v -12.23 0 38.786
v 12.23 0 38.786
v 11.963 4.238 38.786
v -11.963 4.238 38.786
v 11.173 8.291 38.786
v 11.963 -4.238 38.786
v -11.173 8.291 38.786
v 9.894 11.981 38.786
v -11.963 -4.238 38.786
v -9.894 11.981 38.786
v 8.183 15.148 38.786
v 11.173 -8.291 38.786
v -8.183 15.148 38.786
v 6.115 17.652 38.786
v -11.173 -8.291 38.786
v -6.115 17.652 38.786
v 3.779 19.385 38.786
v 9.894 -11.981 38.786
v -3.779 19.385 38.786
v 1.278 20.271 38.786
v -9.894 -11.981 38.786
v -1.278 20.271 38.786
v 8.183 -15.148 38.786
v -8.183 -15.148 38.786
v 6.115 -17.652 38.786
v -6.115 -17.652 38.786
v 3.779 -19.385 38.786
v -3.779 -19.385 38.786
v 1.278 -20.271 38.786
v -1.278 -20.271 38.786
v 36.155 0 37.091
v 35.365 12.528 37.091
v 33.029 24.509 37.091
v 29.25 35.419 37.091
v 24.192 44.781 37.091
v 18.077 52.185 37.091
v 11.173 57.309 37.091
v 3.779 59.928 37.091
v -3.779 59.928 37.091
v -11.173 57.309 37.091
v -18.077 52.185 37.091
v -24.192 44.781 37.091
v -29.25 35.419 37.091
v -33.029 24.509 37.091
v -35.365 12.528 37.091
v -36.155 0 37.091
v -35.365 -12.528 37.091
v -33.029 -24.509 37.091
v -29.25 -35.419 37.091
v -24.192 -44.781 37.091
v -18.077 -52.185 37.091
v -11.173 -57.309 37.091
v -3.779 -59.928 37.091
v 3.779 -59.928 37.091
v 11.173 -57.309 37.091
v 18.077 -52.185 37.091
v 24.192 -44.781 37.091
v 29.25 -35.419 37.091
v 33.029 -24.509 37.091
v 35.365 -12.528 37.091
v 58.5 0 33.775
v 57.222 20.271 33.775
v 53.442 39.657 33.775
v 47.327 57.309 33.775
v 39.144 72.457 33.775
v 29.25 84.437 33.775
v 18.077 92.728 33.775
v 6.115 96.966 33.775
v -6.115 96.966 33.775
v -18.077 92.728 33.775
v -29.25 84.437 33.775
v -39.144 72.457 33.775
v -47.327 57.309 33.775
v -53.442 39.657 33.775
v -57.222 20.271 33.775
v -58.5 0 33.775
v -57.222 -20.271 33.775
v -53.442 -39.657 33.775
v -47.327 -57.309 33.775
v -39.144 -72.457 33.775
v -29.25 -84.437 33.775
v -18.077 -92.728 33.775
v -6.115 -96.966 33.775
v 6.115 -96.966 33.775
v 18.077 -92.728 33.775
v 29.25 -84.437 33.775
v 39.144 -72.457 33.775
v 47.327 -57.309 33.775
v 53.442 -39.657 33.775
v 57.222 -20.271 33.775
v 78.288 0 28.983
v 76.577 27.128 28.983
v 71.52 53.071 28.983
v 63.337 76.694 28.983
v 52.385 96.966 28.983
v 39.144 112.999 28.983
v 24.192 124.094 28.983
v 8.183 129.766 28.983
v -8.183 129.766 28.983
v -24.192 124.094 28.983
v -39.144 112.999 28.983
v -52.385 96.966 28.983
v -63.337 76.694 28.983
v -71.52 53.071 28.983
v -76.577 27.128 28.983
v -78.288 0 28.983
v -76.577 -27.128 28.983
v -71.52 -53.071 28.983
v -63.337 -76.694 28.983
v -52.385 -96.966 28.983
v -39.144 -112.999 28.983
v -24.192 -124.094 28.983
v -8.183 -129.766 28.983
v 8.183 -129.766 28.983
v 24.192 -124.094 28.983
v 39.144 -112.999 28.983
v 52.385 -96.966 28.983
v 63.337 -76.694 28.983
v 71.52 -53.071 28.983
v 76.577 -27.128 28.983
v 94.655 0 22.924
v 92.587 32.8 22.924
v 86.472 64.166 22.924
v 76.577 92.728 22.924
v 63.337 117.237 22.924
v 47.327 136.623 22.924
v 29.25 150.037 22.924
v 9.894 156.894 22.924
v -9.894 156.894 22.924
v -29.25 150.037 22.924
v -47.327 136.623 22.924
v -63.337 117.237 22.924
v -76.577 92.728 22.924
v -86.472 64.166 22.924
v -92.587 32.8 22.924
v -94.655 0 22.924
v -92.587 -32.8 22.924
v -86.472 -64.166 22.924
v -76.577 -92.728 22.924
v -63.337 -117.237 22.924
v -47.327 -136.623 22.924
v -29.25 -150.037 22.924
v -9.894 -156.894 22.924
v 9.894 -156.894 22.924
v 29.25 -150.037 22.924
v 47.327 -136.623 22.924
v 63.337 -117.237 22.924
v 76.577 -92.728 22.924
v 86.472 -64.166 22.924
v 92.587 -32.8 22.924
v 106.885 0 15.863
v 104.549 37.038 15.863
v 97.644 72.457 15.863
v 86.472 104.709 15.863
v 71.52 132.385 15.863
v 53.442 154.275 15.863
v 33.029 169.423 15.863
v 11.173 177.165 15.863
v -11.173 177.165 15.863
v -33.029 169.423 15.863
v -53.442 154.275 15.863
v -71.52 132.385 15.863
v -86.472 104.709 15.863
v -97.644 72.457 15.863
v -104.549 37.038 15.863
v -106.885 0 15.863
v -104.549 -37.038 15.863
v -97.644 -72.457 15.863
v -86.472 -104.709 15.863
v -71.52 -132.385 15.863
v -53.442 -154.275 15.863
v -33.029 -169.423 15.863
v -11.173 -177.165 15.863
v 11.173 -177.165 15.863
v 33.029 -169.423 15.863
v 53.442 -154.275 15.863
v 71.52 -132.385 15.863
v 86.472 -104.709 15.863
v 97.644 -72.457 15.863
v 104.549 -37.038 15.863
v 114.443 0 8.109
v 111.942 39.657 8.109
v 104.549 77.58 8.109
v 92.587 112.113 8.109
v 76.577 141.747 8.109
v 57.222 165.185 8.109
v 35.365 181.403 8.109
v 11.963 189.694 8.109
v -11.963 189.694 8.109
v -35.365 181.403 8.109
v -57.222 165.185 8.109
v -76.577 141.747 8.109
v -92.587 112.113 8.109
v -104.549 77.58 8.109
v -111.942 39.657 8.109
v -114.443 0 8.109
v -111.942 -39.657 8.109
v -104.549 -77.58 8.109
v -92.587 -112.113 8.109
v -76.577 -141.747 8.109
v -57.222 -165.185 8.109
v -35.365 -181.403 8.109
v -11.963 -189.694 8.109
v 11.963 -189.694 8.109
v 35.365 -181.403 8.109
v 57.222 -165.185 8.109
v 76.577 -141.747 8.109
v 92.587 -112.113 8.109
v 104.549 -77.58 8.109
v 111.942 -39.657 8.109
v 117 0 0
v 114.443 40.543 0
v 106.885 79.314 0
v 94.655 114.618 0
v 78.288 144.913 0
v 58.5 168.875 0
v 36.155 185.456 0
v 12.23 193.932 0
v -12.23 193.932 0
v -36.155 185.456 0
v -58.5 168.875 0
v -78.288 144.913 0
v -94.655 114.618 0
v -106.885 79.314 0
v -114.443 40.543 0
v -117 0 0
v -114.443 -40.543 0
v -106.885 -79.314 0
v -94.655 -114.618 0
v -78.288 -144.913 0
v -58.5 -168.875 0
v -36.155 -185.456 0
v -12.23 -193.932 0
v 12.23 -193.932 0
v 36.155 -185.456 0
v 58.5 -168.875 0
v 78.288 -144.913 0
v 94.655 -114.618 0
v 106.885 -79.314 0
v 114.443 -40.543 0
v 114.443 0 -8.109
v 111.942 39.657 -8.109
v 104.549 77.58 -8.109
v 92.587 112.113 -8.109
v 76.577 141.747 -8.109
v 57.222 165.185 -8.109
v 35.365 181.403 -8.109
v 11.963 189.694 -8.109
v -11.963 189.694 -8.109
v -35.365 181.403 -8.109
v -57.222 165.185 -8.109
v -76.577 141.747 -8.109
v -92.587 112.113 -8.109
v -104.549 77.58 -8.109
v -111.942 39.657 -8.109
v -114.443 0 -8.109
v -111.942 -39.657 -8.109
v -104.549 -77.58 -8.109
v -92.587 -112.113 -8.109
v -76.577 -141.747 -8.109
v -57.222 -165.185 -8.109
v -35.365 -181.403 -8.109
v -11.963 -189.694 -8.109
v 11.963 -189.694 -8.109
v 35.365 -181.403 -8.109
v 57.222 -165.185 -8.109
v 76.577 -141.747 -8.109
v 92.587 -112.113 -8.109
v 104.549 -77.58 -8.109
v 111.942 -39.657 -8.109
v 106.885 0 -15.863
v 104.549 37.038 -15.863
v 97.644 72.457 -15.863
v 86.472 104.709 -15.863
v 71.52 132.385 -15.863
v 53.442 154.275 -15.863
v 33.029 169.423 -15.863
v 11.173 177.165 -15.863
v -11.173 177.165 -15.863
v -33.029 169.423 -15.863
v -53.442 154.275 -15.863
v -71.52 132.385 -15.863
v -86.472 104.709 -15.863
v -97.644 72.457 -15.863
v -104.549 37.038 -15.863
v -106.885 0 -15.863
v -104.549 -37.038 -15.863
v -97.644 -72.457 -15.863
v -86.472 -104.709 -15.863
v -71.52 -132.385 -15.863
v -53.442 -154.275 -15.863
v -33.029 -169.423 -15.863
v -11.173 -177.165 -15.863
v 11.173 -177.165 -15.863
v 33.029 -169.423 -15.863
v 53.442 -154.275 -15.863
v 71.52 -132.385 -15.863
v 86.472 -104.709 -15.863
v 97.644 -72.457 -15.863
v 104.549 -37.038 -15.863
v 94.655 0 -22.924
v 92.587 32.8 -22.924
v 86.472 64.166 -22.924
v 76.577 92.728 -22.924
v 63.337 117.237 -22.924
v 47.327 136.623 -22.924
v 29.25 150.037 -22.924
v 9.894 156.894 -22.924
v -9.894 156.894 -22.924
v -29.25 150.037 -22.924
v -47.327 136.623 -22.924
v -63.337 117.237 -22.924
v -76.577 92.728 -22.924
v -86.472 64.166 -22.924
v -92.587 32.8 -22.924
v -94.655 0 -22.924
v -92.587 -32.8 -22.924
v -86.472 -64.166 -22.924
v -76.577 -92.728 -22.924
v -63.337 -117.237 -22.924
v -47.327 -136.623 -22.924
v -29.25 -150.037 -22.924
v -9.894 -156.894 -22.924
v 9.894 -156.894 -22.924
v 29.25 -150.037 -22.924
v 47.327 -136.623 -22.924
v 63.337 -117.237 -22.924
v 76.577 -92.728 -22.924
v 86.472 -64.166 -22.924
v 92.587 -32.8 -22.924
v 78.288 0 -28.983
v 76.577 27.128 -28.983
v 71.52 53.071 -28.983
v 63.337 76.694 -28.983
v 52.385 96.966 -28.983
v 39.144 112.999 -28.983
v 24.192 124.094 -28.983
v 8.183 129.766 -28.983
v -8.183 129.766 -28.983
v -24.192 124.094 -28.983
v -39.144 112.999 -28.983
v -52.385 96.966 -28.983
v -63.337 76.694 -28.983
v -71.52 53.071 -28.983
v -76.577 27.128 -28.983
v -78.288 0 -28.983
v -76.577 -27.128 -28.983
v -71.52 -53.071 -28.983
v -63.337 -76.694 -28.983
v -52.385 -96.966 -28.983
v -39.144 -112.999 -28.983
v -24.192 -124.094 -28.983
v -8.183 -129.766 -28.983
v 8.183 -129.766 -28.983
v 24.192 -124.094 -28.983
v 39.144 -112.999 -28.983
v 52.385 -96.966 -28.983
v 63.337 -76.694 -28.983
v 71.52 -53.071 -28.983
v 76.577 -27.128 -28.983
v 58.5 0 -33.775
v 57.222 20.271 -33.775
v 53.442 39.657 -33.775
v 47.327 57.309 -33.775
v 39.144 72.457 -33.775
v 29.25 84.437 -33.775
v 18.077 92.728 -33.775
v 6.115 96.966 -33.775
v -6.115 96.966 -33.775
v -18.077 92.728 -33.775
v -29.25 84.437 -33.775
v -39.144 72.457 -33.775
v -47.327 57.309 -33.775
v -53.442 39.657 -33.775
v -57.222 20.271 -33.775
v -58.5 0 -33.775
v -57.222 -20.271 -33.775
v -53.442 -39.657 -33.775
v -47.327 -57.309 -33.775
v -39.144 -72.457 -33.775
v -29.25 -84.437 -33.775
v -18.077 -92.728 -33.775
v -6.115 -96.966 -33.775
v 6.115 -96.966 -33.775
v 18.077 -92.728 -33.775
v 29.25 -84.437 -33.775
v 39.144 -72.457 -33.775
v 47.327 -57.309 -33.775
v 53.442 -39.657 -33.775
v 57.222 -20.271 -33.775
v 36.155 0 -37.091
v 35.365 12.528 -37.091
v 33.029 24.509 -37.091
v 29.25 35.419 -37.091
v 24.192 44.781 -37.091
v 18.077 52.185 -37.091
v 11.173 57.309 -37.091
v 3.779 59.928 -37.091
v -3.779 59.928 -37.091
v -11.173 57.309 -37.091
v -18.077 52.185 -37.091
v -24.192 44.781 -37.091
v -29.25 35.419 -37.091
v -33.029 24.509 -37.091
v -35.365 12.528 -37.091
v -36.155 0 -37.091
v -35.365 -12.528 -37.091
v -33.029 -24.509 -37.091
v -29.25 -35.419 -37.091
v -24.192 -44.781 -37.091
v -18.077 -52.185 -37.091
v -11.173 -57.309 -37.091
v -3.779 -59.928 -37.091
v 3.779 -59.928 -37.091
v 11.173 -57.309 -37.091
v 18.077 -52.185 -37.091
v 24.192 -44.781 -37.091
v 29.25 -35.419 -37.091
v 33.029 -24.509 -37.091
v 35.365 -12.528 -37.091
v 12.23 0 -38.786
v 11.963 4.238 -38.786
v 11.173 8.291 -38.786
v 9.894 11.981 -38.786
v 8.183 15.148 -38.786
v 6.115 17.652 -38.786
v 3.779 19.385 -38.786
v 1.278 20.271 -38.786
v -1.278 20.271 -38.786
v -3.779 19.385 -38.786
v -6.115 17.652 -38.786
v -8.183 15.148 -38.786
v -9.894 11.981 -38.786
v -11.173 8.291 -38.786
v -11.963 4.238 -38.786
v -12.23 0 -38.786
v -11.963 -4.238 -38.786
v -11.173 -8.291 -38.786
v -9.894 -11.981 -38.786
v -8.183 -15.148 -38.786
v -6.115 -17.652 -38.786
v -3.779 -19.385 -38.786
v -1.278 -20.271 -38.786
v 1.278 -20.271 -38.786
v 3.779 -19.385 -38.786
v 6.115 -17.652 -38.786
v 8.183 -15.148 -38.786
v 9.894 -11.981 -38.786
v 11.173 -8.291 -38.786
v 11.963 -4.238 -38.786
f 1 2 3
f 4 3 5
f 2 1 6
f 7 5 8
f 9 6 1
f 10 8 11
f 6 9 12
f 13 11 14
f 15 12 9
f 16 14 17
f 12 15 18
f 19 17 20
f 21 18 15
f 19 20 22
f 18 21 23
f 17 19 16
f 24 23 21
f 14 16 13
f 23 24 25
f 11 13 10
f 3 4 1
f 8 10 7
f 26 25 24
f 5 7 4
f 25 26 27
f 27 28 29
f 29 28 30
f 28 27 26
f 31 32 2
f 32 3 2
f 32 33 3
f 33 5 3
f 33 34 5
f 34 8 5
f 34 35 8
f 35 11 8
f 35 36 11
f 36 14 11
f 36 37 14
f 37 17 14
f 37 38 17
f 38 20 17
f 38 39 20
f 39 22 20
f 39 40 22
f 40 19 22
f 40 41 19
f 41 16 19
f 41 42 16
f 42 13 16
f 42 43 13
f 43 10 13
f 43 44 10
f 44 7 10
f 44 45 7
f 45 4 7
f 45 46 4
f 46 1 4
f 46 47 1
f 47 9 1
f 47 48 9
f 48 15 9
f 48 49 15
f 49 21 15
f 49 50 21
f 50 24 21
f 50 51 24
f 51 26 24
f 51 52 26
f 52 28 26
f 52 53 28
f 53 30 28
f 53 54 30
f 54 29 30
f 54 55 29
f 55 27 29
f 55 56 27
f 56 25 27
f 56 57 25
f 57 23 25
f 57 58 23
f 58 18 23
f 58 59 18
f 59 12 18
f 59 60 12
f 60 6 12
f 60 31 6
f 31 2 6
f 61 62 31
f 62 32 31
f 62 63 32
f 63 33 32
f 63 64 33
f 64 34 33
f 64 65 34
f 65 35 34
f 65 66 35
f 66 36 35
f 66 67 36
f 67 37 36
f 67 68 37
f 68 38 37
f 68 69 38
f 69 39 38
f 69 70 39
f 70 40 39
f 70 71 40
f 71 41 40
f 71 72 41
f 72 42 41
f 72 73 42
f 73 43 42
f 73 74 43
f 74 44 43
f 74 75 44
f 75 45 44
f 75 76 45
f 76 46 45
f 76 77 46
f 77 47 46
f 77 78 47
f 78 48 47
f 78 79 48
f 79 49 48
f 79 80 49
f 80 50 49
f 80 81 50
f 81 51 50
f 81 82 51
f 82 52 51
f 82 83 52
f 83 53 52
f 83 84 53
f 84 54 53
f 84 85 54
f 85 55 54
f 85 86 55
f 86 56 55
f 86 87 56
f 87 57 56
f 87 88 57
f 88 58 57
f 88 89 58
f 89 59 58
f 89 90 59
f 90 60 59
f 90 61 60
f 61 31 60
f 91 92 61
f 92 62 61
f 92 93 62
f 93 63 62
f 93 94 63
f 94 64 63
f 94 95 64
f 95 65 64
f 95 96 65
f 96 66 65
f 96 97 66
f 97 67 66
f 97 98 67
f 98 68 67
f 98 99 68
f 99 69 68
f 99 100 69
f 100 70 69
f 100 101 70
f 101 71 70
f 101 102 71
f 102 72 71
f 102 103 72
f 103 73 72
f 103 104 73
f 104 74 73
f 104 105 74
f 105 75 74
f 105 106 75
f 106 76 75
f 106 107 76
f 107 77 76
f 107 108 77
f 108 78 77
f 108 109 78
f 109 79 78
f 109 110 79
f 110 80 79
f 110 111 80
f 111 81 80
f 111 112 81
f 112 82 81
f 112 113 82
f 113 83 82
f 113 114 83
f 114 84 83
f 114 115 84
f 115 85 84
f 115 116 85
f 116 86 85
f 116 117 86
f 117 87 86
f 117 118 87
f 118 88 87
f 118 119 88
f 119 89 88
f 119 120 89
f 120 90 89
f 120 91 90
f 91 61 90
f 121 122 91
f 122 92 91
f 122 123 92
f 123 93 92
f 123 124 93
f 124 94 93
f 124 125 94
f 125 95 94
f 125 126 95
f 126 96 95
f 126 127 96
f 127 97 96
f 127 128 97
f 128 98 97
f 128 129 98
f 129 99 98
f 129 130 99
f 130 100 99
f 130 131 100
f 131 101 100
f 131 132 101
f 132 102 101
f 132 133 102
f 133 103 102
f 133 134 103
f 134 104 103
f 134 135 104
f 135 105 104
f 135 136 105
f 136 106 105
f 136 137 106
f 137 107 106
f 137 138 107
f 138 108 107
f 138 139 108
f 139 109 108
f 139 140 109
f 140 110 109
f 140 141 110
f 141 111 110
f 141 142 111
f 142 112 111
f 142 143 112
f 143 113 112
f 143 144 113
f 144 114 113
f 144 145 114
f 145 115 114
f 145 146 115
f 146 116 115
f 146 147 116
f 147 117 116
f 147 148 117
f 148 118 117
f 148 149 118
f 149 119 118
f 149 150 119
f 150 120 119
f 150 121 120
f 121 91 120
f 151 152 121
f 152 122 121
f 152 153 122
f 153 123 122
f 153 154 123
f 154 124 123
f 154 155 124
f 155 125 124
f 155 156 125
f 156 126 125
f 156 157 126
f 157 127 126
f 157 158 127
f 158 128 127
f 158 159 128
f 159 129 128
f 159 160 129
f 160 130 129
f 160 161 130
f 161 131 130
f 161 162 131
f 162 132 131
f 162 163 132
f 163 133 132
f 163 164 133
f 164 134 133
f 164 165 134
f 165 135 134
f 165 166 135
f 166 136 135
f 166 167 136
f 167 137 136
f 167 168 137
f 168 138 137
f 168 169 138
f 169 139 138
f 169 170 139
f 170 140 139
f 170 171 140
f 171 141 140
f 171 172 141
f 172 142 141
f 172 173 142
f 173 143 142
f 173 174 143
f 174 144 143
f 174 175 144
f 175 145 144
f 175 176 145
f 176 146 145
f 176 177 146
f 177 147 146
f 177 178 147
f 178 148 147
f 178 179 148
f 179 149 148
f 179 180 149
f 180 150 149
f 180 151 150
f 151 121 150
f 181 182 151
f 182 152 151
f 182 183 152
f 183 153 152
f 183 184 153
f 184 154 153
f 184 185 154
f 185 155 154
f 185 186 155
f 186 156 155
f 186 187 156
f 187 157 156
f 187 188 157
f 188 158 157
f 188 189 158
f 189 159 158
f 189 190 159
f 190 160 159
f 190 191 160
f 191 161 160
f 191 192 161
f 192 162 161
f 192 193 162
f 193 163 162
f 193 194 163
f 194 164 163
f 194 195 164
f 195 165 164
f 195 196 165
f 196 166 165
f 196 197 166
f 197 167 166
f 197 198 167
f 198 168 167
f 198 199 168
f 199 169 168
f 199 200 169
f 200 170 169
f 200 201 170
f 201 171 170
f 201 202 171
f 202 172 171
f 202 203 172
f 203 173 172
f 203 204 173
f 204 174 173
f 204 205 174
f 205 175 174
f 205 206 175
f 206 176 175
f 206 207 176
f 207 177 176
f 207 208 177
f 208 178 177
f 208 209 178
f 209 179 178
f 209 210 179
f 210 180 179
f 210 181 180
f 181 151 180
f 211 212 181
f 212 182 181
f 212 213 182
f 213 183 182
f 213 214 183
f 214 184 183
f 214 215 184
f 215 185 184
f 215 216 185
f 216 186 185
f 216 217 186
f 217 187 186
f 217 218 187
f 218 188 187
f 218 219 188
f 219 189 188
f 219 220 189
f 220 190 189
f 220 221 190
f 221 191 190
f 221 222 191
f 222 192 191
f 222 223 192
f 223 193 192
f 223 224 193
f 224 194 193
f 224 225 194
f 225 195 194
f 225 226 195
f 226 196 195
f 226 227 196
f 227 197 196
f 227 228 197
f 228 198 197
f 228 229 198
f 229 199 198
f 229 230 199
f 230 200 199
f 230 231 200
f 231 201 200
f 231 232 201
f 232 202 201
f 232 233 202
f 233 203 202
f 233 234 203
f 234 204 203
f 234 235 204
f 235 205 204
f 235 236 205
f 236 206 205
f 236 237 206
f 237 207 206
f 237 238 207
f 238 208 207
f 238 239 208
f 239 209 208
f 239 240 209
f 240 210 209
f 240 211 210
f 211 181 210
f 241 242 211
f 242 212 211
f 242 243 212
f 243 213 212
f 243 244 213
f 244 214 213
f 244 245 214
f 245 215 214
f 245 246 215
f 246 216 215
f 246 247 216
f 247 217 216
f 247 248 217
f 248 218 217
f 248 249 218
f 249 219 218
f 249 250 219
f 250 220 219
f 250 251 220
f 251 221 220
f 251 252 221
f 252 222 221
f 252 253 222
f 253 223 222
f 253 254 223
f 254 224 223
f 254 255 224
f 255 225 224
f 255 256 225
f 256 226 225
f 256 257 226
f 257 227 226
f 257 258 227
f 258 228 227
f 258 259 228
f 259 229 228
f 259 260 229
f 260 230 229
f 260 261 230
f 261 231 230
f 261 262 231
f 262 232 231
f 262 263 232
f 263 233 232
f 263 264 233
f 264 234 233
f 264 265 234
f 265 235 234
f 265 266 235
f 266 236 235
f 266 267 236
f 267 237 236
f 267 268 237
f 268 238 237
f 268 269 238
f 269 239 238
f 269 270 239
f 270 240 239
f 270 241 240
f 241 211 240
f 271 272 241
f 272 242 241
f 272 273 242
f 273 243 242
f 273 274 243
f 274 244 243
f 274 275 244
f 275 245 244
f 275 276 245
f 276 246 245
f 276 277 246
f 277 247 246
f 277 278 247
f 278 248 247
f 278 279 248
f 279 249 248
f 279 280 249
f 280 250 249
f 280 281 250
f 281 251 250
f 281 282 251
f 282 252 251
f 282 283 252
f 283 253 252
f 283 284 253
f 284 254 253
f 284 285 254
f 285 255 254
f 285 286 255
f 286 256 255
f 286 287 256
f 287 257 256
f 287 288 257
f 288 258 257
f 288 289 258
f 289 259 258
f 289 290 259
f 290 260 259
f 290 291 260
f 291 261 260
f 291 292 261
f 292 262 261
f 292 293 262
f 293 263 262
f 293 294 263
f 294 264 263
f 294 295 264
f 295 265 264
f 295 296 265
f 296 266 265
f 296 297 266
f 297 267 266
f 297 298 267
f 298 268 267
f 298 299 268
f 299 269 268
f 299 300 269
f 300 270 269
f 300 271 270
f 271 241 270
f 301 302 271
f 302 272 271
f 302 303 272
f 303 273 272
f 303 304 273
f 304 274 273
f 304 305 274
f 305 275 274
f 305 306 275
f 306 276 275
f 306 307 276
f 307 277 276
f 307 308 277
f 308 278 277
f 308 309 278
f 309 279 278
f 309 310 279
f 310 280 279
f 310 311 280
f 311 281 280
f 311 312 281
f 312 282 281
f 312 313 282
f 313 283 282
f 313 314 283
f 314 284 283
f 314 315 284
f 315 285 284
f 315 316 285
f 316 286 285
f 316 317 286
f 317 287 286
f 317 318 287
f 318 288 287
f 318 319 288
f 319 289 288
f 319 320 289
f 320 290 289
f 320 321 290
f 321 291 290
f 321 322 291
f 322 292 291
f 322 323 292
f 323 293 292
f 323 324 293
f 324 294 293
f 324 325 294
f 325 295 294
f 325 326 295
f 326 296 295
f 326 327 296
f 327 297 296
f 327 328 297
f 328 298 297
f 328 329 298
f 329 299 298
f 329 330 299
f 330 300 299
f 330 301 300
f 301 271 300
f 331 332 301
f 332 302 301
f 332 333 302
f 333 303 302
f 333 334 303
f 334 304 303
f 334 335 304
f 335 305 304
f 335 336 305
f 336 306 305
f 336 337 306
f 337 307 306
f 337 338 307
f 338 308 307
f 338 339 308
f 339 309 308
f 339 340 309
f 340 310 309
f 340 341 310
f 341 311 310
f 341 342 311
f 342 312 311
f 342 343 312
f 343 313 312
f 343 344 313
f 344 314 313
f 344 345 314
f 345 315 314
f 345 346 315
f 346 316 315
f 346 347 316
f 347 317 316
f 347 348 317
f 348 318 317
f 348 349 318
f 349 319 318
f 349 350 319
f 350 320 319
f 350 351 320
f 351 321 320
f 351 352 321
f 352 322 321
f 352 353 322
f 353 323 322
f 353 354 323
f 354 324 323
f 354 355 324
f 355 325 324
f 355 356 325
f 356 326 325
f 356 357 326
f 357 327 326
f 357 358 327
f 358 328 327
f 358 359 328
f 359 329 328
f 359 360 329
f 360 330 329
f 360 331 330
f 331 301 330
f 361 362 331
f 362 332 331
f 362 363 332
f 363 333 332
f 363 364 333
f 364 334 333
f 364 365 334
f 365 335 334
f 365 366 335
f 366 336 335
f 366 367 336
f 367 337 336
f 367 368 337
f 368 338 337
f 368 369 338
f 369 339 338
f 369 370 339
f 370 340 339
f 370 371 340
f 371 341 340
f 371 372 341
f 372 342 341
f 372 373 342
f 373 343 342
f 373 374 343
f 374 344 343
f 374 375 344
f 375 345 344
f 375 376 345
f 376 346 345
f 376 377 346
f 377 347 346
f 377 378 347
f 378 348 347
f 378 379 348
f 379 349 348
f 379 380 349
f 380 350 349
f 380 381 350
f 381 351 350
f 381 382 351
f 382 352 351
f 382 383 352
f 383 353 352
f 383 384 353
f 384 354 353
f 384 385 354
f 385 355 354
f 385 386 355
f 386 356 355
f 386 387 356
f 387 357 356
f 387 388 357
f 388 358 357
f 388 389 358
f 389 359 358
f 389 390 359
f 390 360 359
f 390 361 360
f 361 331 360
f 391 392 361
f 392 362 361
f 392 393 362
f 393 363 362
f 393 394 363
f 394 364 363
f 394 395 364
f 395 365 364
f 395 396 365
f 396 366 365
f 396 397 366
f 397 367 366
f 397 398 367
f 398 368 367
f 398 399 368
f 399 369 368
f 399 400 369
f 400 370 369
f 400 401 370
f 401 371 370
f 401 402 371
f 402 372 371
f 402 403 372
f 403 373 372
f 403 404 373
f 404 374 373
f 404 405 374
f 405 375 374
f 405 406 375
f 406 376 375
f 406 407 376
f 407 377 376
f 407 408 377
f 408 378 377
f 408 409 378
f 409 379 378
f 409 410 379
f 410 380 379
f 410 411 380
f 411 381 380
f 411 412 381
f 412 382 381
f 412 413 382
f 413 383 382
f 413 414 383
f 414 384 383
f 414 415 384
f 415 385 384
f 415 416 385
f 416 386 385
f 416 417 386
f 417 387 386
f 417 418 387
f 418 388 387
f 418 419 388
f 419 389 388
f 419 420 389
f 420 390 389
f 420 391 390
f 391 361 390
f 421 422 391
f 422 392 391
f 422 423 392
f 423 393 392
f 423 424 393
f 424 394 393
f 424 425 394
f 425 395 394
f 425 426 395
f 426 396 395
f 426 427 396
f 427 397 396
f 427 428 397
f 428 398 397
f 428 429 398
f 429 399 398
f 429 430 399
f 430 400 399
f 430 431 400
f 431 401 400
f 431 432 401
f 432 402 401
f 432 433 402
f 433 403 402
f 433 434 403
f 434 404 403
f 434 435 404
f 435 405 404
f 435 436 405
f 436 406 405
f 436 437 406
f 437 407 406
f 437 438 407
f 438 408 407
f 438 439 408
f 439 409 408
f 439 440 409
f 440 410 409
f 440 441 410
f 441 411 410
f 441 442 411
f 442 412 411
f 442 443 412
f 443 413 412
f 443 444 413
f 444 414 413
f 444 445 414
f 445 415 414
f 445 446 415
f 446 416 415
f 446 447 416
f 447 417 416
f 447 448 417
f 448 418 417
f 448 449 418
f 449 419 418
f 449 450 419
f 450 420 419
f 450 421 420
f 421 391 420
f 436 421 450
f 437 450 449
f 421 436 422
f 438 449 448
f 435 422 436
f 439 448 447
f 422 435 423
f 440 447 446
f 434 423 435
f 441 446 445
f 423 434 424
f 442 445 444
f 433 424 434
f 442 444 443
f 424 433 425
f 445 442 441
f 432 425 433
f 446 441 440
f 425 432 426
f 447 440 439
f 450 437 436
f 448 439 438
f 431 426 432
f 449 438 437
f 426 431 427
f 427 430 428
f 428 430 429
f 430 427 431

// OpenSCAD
// Generated by SolidPython 1.0.1 on 2020-07-29 00:46:49


scale(v = [9, 15, 3]) {
	sphere(r = 13);
}
/***********************************************
*********      SolidPython code:      **********
************************************************
 
# import packages: SolidPython
from solid import *
from solid.utils import *
from itertools import chain, combinations, permutations


class Resize:

    def __init__(self, scad_file):
        self.scad_file = scad_file
        #self.scad_file = import_scad(scad_file)
        # cone/cylinder param:
        self.r1 = 0
        self.r2 = 0
        self.h = 0
        # rectangular prism param:
        self.w = 0
        self.l = 0
        # ellipse param:
        self.r = 0

    # import OpenScad code (file name corresponds to shape)


    # classify shape + parameters
    def assign(self, param1, param2, param3):
        if self.scad_file == 'cone.scad':
            self.r1 = param1
            self.r2 = param2
            self.h = param3
        elif self.scad_file == 'cylinder.scad':
            self.r1 = param1
            self.r2 = param2
            self.h = param3
        elif self.scad_file == 'rectangularPrism.scad':
            self.h = param1
            self.l = param2
            self.w = param3
        else:
            self.r = param1
            self.h = param2

    # resize parameters
    def iterate(self):
        x = range(3, 20, 2)
        i = 1
        if self.scad_file == 'cone.scad':
            tempList = list(permutations(x, 2))
            for temp in tempList:
                param1 = temp[0]
                param2 = temp[1]
                filepath = 'produced_scad_files/' + 'cone' + str(param1) + '_' + str(param2) + '_' + '.scad'
                scad_render_to_file(cylinder(h=param1, r1=param2, r2=0), filepath)

        elif self.scad_file == 'cylinder.scad':
            tempList = list(permutations(x, 3))
            for temp in tempList:
                param1 = temp[0]
                param2 = temp[1]
                filepath = 'produced_scad_files/' + 'cylinder' + str(param1) + '_' + str(param2) + '_' + '.scad'
                scad_render_to_file(cylinder(h=param1, r1=param2, r2=param2), filepath)

        elif self.scad_file == 'rectangularPrism.scad':
            tempList = list(permutations(x, 3))
            for temp in tempList:
                param1 = temp[0]
                param2 = temp[1]
                param3 = temp[2]
                filepath = 'produced_scad_files/' + 'rectangularPrism' + str(param1) + '_' + str(param2) + '_' + str(
                    param3) + '.scad'
                scad_render_to_file(cube(size=(param1, param2, param3)), filepath)

        elif self.scad_file == 'ellipse.scad':
            tempList = list(permutations(x, 4))
            for temp in tempList:
                param1 = temp[0]
                param2 = temp[1]
                param3 = temp[2]
                param4 = temp[3]
                filepath = 'produced_scad_files/' + 'ellipse' + str(param1) + '_' + str(param2) + '_' + str(param3) + '_' + str(param4) + '.scad'
                scad_render_to_file(scale([param1, param2, param3])(sphere(r=param4)), filepath)

    def render_to_scadfile(self):
        scad_render_to_file(scad, 'example.scad') 
 
************************************************/
